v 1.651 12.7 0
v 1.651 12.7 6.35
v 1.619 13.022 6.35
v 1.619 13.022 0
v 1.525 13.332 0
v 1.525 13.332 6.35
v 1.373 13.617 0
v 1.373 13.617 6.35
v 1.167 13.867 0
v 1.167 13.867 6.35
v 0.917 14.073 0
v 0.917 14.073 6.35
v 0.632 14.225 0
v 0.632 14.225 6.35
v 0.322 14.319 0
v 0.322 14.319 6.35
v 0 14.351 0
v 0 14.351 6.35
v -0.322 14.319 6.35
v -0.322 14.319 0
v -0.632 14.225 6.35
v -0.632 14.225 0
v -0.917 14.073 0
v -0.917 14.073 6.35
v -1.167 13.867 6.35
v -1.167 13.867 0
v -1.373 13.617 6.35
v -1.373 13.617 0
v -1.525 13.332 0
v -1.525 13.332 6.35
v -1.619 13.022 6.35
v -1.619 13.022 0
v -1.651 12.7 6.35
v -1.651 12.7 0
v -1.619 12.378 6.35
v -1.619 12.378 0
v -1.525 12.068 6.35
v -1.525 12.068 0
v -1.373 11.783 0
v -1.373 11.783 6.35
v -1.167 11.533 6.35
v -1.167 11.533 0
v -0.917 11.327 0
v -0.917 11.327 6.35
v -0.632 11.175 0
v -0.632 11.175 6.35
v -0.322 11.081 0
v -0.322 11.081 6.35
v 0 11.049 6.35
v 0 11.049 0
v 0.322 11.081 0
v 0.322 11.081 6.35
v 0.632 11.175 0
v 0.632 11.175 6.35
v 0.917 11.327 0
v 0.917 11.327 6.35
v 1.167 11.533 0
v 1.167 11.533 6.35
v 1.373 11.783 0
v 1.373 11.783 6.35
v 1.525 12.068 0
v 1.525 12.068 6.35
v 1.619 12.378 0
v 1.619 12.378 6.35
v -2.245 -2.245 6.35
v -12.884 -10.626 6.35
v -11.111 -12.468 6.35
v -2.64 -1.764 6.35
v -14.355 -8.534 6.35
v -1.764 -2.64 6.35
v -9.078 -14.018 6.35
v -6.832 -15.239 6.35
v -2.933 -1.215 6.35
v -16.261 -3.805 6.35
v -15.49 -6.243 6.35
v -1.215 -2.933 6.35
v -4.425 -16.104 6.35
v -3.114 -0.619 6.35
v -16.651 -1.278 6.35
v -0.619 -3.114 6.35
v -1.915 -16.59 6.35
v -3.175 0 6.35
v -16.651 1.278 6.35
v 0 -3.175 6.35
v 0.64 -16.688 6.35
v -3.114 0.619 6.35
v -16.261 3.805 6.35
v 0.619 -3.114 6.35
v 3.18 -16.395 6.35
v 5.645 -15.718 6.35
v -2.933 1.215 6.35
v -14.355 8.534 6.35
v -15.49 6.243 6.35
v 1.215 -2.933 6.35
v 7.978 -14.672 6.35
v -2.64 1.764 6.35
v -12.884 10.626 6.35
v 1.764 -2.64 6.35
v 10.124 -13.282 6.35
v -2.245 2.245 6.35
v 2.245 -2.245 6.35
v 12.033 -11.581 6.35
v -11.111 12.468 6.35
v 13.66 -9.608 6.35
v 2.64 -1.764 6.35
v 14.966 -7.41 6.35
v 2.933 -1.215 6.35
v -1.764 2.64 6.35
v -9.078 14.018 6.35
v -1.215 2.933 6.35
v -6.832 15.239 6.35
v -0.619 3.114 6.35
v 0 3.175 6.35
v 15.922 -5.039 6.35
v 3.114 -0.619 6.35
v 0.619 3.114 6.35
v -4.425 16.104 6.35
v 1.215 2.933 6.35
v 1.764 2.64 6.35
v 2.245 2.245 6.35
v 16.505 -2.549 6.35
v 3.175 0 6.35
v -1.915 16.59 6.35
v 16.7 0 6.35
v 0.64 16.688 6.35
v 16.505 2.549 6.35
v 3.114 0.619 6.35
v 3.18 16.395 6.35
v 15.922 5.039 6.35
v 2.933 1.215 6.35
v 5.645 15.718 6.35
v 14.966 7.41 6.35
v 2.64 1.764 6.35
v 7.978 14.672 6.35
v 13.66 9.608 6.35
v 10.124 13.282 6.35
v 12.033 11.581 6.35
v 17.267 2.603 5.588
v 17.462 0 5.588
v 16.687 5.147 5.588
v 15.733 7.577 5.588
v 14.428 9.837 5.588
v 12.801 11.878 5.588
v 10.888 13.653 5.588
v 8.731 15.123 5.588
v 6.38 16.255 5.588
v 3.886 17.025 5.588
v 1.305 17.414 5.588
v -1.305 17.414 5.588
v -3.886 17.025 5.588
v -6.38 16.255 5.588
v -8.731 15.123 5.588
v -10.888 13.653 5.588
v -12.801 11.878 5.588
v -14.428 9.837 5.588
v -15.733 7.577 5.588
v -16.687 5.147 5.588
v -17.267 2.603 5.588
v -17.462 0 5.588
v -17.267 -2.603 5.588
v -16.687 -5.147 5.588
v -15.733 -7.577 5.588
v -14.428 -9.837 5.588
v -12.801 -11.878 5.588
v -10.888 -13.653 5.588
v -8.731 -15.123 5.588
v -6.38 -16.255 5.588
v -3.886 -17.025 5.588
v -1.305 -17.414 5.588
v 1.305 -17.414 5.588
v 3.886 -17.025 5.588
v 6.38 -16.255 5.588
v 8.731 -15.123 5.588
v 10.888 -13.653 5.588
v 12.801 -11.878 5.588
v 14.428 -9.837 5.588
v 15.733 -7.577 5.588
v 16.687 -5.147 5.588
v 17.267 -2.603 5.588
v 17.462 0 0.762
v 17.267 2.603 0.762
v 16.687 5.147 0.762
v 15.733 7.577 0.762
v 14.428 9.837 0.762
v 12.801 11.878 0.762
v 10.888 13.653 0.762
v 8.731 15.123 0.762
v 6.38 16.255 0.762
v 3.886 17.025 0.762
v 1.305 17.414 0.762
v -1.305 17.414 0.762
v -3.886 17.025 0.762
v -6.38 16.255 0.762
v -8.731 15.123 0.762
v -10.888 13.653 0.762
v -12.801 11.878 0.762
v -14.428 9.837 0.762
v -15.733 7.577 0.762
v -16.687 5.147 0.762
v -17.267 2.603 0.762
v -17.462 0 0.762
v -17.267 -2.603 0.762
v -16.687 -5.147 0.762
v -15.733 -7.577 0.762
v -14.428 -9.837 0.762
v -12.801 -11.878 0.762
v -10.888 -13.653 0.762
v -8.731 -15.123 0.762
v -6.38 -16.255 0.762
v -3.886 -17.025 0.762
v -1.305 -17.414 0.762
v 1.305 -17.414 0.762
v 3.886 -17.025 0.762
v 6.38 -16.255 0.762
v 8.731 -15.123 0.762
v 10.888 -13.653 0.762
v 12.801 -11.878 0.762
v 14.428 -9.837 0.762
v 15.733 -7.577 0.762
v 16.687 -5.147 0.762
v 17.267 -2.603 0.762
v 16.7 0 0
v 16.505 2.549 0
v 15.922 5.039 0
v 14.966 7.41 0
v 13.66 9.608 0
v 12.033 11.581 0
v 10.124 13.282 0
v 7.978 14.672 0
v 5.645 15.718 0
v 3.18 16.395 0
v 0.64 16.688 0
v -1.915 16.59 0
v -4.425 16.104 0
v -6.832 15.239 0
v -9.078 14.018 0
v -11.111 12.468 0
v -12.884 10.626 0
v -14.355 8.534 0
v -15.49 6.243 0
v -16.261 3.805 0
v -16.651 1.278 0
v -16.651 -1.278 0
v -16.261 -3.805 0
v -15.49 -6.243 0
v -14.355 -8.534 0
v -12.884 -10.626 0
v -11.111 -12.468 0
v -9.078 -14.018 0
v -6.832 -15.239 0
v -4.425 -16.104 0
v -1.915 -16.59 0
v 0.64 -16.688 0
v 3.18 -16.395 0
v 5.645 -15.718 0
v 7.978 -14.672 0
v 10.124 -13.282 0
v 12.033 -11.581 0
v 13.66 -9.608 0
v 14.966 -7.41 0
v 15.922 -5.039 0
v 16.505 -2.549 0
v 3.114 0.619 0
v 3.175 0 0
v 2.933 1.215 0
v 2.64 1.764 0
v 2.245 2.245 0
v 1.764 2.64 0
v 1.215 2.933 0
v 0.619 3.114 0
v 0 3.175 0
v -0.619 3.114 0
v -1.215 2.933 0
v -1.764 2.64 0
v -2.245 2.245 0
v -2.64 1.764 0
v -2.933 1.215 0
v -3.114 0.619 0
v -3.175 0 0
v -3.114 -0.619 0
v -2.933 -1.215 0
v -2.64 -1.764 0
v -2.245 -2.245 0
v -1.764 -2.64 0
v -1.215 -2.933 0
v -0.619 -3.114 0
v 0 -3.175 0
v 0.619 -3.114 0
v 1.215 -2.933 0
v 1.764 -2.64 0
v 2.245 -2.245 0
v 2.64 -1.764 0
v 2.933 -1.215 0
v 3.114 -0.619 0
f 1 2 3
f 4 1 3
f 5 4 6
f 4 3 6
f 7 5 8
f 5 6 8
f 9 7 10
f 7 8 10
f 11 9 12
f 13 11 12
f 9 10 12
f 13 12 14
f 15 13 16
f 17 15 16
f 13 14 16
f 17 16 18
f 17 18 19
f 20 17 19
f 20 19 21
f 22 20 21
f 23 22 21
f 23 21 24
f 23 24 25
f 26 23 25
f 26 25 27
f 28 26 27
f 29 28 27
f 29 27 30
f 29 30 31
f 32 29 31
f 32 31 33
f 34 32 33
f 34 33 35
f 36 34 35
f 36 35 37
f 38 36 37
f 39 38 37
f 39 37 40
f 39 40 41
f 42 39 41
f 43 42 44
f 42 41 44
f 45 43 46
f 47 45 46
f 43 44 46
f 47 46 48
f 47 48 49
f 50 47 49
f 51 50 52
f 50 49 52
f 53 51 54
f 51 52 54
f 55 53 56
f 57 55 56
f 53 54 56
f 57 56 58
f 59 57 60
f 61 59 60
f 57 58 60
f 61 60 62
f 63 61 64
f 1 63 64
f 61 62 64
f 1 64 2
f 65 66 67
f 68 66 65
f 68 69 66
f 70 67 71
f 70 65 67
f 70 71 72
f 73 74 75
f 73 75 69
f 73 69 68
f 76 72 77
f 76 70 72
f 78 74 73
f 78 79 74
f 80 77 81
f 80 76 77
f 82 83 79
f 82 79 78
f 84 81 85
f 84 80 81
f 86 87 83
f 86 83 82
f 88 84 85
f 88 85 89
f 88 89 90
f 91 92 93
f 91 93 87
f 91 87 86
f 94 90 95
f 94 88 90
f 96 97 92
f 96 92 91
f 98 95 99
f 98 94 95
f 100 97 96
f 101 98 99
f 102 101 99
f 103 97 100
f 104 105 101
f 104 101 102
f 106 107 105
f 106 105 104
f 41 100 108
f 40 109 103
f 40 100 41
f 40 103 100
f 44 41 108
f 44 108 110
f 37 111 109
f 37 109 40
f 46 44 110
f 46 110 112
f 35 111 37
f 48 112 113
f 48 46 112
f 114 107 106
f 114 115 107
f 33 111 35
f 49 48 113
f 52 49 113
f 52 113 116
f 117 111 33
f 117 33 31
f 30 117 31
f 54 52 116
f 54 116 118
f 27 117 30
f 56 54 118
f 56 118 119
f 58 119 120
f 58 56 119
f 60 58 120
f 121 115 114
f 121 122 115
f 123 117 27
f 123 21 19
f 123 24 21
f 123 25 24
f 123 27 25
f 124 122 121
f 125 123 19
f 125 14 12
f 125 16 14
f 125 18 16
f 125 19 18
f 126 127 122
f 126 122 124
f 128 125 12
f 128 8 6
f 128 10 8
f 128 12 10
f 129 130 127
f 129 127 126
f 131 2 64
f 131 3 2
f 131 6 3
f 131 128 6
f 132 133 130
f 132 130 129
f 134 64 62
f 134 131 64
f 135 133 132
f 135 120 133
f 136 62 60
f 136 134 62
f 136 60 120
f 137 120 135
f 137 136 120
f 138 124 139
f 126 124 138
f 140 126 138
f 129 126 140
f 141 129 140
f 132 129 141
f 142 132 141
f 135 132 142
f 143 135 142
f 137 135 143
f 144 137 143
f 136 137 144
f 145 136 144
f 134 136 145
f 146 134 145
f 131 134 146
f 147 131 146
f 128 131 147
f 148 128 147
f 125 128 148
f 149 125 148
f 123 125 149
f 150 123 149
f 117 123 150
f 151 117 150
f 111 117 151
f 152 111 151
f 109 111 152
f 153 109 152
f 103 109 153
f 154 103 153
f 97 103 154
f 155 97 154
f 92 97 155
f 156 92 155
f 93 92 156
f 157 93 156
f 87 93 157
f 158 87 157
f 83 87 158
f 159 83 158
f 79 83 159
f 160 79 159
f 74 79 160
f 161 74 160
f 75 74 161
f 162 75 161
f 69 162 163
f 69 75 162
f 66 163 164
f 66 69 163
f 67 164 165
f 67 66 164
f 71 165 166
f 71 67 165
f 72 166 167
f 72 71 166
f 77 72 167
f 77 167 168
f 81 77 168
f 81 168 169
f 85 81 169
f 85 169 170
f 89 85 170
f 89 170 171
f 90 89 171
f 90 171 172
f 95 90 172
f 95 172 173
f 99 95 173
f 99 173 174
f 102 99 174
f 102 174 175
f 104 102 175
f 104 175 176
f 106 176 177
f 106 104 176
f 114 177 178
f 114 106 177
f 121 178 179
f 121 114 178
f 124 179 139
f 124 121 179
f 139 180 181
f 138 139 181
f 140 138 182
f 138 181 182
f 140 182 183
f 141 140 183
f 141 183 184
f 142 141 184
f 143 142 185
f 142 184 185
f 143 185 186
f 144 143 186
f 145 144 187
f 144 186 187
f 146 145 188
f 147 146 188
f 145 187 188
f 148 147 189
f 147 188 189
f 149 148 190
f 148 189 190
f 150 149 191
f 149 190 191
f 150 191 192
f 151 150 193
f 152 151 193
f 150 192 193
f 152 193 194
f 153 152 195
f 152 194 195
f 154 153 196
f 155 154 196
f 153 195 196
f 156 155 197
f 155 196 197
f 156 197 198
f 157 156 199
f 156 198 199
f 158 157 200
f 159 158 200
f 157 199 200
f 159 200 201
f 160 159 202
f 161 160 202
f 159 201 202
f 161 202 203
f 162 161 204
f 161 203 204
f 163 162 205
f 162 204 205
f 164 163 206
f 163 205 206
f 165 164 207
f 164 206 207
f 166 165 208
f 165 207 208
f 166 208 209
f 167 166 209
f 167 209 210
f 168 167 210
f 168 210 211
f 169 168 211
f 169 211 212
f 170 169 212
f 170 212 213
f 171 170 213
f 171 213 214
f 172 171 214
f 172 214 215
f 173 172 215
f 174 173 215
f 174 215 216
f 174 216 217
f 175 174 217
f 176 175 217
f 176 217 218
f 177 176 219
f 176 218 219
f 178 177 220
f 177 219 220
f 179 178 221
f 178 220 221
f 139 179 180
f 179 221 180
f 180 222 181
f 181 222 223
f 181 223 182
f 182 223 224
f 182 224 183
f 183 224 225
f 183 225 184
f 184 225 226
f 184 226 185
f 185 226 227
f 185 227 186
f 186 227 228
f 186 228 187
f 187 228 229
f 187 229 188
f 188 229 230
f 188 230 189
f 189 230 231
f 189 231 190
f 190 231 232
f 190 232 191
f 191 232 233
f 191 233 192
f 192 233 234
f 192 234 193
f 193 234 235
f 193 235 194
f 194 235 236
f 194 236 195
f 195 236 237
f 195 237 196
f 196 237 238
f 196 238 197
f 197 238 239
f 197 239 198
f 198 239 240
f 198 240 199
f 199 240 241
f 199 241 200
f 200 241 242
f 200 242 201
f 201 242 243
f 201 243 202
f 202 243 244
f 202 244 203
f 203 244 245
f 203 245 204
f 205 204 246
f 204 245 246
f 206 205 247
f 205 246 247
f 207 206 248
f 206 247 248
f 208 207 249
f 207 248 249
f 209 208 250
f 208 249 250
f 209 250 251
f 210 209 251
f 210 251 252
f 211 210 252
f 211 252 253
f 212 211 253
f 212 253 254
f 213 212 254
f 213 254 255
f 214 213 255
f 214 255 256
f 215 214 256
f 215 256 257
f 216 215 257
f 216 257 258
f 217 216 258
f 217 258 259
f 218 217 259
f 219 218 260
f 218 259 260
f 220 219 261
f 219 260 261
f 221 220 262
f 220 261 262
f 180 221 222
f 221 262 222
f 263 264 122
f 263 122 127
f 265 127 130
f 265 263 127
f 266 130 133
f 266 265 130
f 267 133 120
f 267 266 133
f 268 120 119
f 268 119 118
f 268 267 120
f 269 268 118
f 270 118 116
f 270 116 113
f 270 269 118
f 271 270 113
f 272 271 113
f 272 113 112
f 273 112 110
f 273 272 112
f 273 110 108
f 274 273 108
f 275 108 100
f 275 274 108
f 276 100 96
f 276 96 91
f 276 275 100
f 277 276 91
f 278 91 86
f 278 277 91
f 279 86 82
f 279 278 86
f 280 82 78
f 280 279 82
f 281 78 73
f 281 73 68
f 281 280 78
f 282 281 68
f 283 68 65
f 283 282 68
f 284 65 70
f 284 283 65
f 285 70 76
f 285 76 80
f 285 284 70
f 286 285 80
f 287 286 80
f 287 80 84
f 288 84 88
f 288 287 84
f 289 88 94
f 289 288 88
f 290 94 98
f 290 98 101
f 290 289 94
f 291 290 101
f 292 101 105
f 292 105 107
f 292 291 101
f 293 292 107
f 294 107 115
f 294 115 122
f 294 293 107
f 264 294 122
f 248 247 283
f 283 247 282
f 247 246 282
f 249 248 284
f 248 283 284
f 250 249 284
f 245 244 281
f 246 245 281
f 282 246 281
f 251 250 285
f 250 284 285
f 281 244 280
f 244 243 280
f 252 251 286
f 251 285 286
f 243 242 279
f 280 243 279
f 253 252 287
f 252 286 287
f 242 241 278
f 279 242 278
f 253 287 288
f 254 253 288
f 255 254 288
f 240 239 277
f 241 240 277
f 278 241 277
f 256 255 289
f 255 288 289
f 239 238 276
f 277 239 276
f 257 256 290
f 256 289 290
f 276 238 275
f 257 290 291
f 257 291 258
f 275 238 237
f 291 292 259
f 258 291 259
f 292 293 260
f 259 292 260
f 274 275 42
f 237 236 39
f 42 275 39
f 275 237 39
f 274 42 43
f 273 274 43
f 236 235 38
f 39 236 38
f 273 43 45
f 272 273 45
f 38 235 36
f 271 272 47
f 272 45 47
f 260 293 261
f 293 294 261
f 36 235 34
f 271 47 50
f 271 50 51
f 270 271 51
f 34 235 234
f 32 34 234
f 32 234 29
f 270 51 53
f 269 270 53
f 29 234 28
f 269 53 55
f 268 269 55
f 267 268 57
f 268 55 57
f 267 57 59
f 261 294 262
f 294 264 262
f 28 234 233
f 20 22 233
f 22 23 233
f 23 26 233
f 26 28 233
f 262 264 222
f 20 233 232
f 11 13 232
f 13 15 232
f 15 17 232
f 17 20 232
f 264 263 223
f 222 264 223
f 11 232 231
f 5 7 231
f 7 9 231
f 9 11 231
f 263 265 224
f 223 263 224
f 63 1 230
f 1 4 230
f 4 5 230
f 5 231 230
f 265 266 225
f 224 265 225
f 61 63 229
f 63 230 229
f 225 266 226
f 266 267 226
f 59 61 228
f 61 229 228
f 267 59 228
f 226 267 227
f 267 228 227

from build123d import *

# Parameters (mm, degrees)
SKETCH1_R           = 17.4625
SKETCH1_R_2         = 3.175
BOSS_EXTRUDE1_DEPTH = 6.35
SKETCH3_R           = 1.651
CUT_EXTRUDE3_DEPTH  = 16.51
CHAMFER1_SIZE       = 0.762
CHAMFER2_SIZE       = 0.762


with BuildPart() as part:
    # Sketch1 → Boss-Extrude1 (new body)
    with BuildSketch(Plane.XY):
        Circle(SKETCH1_R)
        Circle(SKETCH1_R_2, mode=Mode.SUBTRACT)
    extrude(amount=BOSS_EXTRUDE1_DEPTH)

    # Sketch3 → Cut-Extrude3 (cut)
    with BuildSketch(Plane.XY.offset(6.35)):
        with Locations((0, 12.7)):
            Circle(SKETCH3_R)
    extrude(amount=-CUT_EXTRUDE3_DEPTH, mode=Mode.SUBTRACT)

    # Chamfer1
    chamfer1_edges = [part.edges().sort_by_distance(p)[0] for p in [
        (-17.4625, 0, 6.35),
    ]]
    chamfer(chamfer1_edges, length=CHAMFER1_SIZE)

    # Chamfer2
    chamfer2_edges = [part.edges().sort_by_distance(p)[0] for p in [
        (-17.4625, 0, 0),
    ]]
    chamfer(chamfer2_edges, length=CHAMFER2_SIZE)


solid = part.part
